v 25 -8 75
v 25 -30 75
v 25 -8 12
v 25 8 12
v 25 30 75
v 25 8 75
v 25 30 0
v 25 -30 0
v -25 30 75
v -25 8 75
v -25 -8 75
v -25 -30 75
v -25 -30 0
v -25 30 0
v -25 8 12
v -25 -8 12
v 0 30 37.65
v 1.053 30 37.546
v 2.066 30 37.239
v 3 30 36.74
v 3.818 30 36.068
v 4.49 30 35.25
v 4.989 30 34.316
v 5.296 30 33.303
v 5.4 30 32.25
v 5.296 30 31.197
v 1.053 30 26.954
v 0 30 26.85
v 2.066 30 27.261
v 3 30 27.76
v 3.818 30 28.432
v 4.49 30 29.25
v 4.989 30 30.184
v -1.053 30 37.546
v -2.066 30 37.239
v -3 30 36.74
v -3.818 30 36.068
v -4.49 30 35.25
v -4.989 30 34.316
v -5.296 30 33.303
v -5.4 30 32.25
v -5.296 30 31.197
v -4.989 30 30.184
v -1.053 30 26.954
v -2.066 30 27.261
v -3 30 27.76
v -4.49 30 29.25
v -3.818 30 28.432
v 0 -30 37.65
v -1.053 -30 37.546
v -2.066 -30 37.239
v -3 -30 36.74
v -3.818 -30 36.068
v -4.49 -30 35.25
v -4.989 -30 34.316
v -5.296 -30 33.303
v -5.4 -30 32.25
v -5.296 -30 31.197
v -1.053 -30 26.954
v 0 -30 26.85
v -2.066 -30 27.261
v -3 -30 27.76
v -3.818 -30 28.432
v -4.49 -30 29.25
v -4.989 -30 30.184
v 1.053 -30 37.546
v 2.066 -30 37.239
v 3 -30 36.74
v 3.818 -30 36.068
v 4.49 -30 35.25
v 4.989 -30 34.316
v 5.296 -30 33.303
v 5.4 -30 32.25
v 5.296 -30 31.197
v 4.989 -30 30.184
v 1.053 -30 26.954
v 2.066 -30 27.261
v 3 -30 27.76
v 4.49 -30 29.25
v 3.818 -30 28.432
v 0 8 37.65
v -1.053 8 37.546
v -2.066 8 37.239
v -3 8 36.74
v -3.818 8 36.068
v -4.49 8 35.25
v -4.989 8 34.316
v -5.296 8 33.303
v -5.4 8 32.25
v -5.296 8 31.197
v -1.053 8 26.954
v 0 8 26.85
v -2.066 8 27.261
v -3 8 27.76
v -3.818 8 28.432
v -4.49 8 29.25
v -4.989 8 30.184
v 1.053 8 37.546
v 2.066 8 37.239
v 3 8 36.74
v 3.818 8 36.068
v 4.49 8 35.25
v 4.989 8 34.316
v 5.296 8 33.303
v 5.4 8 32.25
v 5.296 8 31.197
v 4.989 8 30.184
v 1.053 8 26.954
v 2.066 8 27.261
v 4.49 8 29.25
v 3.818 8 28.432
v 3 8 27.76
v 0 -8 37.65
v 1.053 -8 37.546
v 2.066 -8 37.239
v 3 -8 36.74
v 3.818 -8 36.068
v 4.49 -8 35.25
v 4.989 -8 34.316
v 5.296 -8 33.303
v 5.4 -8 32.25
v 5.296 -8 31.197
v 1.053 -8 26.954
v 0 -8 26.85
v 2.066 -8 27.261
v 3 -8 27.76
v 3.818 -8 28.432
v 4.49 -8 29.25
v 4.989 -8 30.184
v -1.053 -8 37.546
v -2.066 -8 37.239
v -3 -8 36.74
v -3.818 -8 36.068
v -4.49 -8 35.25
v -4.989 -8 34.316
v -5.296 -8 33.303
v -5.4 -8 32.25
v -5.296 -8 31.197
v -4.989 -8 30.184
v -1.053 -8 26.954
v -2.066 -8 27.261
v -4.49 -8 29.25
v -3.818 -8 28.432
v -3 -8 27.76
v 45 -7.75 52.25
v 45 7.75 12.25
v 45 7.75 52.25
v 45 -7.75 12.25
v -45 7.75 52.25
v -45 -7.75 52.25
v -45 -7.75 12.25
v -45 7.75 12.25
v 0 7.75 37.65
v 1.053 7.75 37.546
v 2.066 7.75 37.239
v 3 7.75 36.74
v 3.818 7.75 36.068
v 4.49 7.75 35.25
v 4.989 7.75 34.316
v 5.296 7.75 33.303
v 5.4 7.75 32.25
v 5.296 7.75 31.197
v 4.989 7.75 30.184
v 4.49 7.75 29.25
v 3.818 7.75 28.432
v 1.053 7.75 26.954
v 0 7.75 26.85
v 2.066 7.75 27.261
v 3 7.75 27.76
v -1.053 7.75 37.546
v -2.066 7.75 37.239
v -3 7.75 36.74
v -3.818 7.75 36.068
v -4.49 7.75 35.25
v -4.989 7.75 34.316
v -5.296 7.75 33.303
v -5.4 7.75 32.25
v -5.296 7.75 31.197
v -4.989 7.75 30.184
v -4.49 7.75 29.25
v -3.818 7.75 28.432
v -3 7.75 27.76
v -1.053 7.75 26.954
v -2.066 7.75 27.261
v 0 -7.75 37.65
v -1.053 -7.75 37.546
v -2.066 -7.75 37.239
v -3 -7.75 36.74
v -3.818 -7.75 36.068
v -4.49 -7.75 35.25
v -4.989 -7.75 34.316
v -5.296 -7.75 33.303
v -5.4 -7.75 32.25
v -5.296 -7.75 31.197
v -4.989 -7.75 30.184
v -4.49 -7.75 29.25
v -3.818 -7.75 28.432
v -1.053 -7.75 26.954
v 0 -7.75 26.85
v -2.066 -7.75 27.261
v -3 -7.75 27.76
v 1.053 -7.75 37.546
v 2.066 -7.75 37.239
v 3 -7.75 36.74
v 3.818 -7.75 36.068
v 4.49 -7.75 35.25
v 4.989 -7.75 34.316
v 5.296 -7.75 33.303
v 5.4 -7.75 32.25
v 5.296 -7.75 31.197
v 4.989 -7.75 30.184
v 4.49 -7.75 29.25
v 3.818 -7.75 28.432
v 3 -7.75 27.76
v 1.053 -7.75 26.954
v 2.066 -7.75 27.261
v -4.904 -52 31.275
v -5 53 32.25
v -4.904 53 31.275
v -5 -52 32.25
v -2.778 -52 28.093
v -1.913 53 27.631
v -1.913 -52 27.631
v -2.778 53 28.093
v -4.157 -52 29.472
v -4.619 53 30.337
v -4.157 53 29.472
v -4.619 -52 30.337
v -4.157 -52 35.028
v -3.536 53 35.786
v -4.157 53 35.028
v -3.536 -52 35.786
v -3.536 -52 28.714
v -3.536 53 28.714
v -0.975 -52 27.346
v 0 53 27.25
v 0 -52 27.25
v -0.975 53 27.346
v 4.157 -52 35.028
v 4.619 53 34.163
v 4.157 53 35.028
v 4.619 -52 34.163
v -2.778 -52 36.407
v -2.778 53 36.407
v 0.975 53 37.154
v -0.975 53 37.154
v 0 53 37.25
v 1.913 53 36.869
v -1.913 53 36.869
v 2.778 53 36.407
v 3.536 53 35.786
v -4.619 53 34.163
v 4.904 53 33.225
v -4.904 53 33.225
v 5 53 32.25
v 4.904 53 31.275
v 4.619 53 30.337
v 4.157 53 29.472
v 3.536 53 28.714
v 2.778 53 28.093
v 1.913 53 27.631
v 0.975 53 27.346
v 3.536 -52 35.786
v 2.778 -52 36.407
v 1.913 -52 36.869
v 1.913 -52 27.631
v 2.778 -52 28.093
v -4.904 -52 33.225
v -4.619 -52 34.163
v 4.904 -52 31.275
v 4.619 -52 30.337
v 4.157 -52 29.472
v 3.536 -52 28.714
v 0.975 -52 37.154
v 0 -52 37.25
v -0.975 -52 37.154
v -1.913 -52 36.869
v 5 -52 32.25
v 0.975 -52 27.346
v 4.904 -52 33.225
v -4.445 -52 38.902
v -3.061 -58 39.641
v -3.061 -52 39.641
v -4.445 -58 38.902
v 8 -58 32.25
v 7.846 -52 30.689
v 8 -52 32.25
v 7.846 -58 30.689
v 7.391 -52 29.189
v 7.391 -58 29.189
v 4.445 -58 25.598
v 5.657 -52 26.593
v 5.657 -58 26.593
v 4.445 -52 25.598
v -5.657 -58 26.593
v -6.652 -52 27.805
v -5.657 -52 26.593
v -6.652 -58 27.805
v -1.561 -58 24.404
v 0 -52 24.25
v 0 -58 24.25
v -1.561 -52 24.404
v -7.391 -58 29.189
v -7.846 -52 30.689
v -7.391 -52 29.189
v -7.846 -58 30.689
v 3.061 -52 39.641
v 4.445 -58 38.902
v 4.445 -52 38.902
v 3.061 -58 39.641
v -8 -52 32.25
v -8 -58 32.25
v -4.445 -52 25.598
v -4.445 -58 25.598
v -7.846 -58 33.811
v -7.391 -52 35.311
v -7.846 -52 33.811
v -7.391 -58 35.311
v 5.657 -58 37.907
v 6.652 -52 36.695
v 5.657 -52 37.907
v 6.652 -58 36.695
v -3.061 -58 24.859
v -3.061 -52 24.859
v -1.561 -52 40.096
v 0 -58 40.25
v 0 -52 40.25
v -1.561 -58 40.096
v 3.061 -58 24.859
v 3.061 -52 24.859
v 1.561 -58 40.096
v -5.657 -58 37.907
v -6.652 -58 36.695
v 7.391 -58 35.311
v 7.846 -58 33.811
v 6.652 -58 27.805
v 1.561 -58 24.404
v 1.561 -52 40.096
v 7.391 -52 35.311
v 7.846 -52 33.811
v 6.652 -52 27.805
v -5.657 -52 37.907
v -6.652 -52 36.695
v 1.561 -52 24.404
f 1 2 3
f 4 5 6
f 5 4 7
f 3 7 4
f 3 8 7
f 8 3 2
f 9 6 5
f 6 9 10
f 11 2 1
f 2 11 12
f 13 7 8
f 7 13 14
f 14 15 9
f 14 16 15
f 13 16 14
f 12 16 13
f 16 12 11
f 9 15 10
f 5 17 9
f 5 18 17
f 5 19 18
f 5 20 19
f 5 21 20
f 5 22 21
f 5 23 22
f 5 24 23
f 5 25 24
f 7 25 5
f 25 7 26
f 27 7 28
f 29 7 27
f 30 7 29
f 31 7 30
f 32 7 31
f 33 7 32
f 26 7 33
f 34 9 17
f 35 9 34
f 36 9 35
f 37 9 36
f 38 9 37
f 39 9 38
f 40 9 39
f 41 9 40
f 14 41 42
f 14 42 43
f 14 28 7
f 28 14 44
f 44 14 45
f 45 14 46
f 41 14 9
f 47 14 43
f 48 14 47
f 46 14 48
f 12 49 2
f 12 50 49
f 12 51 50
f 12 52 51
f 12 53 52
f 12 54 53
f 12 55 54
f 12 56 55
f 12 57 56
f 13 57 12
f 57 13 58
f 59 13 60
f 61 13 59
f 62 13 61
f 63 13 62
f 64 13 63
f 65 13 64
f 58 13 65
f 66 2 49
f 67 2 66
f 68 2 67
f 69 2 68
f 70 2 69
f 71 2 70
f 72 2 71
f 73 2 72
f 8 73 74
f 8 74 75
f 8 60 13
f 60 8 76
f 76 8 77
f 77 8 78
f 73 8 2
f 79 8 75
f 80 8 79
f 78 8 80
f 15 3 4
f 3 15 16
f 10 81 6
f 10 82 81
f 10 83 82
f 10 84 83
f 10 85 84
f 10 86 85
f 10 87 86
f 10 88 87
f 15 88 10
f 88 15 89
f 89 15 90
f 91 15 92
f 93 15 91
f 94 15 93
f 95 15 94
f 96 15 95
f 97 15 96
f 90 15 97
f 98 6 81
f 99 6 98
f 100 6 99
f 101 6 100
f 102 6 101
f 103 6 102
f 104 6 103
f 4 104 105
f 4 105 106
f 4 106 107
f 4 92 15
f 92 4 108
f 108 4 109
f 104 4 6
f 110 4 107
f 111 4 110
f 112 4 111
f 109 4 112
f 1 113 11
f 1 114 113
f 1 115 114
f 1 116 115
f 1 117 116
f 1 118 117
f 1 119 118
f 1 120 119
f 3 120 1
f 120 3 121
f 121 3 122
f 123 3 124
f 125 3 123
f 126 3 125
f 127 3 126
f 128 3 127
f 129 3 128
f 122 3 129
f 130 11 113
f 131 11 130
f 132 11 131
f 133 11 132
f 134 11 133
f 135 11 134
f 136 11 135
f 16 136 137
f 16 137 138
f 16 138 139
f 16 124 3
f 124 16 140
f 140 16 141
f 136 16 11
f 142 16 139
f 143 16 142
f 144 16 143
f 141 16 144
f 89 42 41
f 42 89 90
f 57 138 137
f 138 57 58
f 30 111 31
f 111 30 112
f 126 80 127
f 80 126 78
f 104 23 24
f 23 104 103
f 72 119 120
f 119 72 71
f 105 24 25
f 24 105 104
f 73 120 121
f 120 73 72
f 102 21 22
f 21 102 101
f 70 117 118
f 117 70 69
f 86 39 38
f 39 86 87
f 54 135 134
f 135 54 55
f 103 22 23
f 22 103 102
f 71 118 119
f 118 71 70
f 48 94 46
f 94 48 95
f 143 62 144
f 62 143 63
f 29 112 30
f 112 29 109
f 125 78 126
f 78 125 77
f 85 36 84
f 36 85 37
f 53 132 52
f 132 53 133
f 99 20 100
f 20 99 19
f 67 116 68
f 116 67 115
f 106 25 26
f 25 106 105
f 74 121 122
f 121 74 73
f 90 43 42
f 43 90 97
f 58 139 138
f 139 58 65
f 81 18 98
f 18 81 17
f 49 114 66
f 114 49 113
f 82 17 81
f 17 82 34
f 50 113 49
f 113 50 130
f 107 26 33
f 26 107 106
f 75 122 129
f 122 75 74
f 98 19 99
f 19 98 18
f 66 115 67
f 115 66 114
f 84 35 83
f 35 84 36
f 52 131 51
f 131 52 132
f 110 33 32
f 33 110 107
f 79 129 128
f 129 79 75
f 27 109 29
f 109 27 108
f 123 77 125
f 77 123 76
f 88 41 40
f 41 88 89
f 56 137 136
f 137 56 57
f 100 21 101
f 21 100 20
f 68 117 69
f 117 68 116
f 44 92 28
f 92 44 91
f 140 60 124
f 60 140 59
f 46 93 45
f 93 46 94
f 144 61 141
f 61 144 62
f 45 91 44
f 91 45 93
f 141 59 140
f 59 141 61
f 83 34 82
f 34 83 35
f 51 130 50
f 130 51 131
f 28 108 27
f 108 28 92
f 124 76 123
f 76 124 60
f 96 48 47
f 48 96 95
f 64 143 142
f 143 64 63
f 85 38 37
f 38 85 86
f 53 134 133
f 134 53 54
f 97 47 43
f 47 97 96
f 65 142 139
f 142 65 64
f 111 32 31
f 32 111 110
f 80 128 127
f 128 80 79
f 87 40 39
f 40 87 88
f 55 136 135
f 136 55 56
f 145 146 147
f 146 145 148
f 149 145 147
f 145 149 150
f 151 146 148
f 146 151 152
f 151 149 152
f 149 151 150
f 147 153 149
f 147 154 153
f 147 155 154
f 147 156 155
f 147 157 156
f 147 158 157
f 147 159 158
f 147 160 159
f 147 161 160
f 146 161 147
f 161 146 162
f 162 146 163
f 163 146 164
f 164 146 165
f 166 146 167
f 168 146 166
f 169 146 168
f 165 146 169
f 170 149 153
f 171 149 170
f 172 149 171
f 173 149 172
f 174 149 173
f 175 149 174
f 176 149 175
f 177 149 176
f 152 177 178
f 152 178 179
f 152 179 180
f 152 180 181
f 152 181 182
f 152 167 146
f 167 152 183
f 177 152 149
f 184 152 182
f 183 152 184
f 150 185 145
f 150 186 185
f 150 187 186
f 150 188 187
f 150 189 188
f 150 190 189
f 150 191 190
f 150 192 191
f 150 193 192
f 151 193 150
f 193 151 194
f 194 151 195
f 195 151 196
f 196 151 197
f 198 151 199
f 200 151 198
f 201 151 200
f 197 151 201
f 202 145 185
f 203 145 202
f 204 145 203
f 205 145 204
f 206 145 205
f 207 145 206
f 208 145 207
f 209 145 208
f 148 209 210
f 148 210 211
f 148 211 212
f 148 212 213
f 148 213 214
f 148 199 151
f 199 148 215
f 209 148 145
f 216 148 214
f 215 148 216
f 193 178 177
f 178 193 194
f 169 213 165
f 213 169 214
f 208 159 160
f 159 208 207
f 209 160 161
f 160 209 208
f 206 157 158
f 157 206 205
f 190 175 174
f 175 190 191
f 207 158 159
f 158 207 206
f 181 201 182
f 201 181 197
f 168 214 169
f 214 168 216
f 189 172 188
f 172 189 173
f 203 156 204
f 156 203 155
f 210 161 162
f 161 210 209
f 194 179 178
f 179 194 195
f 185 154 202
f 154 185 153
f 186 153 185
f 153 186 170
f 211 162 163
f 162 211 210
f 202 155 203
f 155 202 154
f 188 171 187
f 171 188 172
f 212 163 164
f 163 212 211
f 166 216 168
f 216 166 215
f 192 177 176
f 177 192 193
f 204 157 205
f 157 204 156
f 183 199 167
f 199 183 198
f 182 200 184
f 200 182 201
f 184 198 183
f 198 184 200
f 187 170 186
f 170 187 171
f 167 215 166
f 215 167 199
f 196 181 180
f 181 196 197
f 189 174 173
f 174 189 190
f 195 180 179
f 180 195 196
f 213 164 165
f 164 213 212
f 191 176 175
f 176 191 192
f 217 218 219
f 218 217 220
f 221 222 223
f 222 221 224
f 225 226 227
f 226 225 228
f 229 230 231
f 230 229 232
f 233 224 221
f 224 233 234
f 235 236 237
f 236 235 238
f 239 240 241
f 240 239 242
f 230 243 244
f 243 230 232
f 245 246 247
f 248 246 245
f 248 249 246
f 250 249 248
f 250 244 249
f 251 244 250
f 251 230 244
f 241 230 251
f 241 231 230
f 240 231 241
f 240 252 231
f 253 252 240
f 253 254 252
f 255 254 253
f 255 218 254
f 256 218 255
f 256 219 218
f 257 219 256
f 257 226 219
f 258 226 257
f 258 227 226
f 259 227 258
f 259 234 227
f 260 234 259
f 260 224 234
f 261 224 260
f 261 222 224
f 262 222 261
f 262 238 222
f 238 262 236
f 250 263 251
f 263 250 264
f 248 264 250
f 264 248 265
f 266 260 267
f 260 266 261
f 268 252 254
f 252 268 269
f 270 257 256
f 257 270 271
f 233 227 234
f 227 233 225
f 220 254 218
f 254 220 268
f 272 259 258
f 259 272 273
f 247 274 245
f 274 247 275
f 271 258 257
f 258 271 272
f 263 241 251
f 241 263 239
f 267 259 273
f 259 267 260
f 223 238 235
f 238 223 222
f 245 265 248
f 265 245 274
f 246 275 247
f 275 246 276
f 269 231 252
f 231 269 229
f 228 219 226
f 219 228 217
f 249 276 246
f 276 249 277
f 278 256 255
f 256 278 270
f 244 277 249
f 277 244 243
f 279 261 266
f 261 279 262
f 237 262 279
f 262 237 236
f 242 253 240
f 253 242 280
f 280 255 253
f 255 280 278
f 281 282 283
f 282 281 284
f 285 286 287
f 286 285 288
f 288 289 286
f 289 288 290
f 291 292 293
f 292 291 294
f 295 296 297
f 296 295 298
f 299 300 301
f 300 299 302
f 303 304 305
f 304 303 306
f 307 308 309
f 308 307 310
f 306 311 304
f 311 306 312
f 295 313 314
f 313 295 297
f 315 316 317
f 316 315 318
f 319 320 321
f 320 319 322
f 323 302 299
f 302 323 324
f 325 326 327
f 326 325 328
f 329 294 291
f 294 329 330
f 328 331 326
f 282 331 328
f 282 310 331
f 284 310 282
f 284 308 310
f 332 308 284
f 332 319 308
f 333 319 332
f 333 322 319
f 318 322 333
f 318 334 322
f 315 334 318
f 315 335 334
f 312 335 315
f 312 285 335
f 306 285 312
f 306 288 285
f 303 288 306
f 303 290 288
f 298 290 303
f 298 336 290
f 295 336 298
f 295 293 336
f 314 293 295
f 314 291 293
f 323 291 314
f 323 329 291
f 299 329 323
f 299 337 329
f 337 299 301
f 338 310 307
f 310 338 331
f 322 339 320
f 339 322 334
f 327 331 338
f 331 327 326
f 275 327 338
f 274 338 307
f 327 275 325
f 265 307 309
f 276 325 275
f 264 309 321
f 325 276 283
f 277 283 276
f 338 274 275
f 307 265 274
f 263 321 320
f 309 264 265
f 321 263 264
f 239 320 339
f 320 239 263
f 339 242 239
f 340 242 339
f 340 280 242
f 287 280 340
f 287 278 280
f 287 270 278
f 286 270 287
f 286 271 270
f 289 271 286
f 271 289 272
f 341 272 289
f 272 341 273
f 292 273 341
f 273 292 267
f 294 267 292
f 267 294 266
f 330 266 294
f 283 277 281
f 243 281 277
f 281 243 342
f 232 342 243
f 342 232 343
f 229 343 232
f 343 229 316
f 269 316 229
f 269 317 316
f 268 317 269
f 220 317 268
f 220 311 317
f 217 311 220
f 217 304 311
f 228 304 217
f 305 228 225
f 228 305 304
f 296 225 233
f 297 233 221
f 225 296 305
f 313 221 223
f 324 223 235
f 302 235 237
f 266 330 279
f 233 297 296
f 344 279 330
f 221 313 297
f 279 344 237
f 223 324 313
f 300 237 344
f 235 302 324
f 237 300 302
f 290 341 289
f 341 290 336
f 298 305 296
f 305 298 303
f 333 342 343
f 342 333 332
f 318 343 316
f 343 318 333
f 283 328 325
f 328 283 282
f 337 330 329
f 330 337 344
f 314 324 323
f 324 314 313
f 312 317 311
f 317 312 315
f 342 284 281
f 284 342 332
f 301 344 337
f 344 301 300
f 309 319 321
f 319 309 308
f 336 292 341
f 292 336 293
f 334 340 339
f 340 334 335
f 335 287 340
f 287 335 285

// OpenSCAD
$fn = 32;

// ------------------------------------------------------------------------
// Clevis joint: 50 mm clevis, pin d10
// Every part is its own module, assembly() places them once.
// ------------------------------------------------------------------------

// --- part 1 ---
module clevis() {
  difference() {
    translate([-25, -30, 0]) cube([50, 60, 75]);
    translate([-26, -8, 12]) cube([52, 16, 64]);
    translate([0, 0, 32.25]) rotate([90, 0, 0]) cylinder(h = 62, d = 10.8, center = true);
  }
}

// --- part 2 ---
module eye() {
  difference() {
    translate([-45, -7.75, 0]) cube([90, 15.5, 40]);
    translate([0, 0, 20]) rotate([90, 0, 0]) cylinder(h = 17.5, d = 10.8, center = true);
  }
}

// --- part 3 ---
module pin() {
  rotate([0, 90, 0]) cylinder(h = 106, d = 10, center = true);
  translate([-58, 0, 0]) rotate([0, 90, 0]) cylinder(h = 6, d = 16);
}

// --- assembly ---
module assembly() {
  translate([0, 0, 0]) rotate([0, 0, 0]) clevis();
  translate([0, 0, 12.25]) rotate([0, 0, 0]) eye();
  translate([0, 0, 32.25]) rotate([0, 0, 90]) pin();
}

assembly();
